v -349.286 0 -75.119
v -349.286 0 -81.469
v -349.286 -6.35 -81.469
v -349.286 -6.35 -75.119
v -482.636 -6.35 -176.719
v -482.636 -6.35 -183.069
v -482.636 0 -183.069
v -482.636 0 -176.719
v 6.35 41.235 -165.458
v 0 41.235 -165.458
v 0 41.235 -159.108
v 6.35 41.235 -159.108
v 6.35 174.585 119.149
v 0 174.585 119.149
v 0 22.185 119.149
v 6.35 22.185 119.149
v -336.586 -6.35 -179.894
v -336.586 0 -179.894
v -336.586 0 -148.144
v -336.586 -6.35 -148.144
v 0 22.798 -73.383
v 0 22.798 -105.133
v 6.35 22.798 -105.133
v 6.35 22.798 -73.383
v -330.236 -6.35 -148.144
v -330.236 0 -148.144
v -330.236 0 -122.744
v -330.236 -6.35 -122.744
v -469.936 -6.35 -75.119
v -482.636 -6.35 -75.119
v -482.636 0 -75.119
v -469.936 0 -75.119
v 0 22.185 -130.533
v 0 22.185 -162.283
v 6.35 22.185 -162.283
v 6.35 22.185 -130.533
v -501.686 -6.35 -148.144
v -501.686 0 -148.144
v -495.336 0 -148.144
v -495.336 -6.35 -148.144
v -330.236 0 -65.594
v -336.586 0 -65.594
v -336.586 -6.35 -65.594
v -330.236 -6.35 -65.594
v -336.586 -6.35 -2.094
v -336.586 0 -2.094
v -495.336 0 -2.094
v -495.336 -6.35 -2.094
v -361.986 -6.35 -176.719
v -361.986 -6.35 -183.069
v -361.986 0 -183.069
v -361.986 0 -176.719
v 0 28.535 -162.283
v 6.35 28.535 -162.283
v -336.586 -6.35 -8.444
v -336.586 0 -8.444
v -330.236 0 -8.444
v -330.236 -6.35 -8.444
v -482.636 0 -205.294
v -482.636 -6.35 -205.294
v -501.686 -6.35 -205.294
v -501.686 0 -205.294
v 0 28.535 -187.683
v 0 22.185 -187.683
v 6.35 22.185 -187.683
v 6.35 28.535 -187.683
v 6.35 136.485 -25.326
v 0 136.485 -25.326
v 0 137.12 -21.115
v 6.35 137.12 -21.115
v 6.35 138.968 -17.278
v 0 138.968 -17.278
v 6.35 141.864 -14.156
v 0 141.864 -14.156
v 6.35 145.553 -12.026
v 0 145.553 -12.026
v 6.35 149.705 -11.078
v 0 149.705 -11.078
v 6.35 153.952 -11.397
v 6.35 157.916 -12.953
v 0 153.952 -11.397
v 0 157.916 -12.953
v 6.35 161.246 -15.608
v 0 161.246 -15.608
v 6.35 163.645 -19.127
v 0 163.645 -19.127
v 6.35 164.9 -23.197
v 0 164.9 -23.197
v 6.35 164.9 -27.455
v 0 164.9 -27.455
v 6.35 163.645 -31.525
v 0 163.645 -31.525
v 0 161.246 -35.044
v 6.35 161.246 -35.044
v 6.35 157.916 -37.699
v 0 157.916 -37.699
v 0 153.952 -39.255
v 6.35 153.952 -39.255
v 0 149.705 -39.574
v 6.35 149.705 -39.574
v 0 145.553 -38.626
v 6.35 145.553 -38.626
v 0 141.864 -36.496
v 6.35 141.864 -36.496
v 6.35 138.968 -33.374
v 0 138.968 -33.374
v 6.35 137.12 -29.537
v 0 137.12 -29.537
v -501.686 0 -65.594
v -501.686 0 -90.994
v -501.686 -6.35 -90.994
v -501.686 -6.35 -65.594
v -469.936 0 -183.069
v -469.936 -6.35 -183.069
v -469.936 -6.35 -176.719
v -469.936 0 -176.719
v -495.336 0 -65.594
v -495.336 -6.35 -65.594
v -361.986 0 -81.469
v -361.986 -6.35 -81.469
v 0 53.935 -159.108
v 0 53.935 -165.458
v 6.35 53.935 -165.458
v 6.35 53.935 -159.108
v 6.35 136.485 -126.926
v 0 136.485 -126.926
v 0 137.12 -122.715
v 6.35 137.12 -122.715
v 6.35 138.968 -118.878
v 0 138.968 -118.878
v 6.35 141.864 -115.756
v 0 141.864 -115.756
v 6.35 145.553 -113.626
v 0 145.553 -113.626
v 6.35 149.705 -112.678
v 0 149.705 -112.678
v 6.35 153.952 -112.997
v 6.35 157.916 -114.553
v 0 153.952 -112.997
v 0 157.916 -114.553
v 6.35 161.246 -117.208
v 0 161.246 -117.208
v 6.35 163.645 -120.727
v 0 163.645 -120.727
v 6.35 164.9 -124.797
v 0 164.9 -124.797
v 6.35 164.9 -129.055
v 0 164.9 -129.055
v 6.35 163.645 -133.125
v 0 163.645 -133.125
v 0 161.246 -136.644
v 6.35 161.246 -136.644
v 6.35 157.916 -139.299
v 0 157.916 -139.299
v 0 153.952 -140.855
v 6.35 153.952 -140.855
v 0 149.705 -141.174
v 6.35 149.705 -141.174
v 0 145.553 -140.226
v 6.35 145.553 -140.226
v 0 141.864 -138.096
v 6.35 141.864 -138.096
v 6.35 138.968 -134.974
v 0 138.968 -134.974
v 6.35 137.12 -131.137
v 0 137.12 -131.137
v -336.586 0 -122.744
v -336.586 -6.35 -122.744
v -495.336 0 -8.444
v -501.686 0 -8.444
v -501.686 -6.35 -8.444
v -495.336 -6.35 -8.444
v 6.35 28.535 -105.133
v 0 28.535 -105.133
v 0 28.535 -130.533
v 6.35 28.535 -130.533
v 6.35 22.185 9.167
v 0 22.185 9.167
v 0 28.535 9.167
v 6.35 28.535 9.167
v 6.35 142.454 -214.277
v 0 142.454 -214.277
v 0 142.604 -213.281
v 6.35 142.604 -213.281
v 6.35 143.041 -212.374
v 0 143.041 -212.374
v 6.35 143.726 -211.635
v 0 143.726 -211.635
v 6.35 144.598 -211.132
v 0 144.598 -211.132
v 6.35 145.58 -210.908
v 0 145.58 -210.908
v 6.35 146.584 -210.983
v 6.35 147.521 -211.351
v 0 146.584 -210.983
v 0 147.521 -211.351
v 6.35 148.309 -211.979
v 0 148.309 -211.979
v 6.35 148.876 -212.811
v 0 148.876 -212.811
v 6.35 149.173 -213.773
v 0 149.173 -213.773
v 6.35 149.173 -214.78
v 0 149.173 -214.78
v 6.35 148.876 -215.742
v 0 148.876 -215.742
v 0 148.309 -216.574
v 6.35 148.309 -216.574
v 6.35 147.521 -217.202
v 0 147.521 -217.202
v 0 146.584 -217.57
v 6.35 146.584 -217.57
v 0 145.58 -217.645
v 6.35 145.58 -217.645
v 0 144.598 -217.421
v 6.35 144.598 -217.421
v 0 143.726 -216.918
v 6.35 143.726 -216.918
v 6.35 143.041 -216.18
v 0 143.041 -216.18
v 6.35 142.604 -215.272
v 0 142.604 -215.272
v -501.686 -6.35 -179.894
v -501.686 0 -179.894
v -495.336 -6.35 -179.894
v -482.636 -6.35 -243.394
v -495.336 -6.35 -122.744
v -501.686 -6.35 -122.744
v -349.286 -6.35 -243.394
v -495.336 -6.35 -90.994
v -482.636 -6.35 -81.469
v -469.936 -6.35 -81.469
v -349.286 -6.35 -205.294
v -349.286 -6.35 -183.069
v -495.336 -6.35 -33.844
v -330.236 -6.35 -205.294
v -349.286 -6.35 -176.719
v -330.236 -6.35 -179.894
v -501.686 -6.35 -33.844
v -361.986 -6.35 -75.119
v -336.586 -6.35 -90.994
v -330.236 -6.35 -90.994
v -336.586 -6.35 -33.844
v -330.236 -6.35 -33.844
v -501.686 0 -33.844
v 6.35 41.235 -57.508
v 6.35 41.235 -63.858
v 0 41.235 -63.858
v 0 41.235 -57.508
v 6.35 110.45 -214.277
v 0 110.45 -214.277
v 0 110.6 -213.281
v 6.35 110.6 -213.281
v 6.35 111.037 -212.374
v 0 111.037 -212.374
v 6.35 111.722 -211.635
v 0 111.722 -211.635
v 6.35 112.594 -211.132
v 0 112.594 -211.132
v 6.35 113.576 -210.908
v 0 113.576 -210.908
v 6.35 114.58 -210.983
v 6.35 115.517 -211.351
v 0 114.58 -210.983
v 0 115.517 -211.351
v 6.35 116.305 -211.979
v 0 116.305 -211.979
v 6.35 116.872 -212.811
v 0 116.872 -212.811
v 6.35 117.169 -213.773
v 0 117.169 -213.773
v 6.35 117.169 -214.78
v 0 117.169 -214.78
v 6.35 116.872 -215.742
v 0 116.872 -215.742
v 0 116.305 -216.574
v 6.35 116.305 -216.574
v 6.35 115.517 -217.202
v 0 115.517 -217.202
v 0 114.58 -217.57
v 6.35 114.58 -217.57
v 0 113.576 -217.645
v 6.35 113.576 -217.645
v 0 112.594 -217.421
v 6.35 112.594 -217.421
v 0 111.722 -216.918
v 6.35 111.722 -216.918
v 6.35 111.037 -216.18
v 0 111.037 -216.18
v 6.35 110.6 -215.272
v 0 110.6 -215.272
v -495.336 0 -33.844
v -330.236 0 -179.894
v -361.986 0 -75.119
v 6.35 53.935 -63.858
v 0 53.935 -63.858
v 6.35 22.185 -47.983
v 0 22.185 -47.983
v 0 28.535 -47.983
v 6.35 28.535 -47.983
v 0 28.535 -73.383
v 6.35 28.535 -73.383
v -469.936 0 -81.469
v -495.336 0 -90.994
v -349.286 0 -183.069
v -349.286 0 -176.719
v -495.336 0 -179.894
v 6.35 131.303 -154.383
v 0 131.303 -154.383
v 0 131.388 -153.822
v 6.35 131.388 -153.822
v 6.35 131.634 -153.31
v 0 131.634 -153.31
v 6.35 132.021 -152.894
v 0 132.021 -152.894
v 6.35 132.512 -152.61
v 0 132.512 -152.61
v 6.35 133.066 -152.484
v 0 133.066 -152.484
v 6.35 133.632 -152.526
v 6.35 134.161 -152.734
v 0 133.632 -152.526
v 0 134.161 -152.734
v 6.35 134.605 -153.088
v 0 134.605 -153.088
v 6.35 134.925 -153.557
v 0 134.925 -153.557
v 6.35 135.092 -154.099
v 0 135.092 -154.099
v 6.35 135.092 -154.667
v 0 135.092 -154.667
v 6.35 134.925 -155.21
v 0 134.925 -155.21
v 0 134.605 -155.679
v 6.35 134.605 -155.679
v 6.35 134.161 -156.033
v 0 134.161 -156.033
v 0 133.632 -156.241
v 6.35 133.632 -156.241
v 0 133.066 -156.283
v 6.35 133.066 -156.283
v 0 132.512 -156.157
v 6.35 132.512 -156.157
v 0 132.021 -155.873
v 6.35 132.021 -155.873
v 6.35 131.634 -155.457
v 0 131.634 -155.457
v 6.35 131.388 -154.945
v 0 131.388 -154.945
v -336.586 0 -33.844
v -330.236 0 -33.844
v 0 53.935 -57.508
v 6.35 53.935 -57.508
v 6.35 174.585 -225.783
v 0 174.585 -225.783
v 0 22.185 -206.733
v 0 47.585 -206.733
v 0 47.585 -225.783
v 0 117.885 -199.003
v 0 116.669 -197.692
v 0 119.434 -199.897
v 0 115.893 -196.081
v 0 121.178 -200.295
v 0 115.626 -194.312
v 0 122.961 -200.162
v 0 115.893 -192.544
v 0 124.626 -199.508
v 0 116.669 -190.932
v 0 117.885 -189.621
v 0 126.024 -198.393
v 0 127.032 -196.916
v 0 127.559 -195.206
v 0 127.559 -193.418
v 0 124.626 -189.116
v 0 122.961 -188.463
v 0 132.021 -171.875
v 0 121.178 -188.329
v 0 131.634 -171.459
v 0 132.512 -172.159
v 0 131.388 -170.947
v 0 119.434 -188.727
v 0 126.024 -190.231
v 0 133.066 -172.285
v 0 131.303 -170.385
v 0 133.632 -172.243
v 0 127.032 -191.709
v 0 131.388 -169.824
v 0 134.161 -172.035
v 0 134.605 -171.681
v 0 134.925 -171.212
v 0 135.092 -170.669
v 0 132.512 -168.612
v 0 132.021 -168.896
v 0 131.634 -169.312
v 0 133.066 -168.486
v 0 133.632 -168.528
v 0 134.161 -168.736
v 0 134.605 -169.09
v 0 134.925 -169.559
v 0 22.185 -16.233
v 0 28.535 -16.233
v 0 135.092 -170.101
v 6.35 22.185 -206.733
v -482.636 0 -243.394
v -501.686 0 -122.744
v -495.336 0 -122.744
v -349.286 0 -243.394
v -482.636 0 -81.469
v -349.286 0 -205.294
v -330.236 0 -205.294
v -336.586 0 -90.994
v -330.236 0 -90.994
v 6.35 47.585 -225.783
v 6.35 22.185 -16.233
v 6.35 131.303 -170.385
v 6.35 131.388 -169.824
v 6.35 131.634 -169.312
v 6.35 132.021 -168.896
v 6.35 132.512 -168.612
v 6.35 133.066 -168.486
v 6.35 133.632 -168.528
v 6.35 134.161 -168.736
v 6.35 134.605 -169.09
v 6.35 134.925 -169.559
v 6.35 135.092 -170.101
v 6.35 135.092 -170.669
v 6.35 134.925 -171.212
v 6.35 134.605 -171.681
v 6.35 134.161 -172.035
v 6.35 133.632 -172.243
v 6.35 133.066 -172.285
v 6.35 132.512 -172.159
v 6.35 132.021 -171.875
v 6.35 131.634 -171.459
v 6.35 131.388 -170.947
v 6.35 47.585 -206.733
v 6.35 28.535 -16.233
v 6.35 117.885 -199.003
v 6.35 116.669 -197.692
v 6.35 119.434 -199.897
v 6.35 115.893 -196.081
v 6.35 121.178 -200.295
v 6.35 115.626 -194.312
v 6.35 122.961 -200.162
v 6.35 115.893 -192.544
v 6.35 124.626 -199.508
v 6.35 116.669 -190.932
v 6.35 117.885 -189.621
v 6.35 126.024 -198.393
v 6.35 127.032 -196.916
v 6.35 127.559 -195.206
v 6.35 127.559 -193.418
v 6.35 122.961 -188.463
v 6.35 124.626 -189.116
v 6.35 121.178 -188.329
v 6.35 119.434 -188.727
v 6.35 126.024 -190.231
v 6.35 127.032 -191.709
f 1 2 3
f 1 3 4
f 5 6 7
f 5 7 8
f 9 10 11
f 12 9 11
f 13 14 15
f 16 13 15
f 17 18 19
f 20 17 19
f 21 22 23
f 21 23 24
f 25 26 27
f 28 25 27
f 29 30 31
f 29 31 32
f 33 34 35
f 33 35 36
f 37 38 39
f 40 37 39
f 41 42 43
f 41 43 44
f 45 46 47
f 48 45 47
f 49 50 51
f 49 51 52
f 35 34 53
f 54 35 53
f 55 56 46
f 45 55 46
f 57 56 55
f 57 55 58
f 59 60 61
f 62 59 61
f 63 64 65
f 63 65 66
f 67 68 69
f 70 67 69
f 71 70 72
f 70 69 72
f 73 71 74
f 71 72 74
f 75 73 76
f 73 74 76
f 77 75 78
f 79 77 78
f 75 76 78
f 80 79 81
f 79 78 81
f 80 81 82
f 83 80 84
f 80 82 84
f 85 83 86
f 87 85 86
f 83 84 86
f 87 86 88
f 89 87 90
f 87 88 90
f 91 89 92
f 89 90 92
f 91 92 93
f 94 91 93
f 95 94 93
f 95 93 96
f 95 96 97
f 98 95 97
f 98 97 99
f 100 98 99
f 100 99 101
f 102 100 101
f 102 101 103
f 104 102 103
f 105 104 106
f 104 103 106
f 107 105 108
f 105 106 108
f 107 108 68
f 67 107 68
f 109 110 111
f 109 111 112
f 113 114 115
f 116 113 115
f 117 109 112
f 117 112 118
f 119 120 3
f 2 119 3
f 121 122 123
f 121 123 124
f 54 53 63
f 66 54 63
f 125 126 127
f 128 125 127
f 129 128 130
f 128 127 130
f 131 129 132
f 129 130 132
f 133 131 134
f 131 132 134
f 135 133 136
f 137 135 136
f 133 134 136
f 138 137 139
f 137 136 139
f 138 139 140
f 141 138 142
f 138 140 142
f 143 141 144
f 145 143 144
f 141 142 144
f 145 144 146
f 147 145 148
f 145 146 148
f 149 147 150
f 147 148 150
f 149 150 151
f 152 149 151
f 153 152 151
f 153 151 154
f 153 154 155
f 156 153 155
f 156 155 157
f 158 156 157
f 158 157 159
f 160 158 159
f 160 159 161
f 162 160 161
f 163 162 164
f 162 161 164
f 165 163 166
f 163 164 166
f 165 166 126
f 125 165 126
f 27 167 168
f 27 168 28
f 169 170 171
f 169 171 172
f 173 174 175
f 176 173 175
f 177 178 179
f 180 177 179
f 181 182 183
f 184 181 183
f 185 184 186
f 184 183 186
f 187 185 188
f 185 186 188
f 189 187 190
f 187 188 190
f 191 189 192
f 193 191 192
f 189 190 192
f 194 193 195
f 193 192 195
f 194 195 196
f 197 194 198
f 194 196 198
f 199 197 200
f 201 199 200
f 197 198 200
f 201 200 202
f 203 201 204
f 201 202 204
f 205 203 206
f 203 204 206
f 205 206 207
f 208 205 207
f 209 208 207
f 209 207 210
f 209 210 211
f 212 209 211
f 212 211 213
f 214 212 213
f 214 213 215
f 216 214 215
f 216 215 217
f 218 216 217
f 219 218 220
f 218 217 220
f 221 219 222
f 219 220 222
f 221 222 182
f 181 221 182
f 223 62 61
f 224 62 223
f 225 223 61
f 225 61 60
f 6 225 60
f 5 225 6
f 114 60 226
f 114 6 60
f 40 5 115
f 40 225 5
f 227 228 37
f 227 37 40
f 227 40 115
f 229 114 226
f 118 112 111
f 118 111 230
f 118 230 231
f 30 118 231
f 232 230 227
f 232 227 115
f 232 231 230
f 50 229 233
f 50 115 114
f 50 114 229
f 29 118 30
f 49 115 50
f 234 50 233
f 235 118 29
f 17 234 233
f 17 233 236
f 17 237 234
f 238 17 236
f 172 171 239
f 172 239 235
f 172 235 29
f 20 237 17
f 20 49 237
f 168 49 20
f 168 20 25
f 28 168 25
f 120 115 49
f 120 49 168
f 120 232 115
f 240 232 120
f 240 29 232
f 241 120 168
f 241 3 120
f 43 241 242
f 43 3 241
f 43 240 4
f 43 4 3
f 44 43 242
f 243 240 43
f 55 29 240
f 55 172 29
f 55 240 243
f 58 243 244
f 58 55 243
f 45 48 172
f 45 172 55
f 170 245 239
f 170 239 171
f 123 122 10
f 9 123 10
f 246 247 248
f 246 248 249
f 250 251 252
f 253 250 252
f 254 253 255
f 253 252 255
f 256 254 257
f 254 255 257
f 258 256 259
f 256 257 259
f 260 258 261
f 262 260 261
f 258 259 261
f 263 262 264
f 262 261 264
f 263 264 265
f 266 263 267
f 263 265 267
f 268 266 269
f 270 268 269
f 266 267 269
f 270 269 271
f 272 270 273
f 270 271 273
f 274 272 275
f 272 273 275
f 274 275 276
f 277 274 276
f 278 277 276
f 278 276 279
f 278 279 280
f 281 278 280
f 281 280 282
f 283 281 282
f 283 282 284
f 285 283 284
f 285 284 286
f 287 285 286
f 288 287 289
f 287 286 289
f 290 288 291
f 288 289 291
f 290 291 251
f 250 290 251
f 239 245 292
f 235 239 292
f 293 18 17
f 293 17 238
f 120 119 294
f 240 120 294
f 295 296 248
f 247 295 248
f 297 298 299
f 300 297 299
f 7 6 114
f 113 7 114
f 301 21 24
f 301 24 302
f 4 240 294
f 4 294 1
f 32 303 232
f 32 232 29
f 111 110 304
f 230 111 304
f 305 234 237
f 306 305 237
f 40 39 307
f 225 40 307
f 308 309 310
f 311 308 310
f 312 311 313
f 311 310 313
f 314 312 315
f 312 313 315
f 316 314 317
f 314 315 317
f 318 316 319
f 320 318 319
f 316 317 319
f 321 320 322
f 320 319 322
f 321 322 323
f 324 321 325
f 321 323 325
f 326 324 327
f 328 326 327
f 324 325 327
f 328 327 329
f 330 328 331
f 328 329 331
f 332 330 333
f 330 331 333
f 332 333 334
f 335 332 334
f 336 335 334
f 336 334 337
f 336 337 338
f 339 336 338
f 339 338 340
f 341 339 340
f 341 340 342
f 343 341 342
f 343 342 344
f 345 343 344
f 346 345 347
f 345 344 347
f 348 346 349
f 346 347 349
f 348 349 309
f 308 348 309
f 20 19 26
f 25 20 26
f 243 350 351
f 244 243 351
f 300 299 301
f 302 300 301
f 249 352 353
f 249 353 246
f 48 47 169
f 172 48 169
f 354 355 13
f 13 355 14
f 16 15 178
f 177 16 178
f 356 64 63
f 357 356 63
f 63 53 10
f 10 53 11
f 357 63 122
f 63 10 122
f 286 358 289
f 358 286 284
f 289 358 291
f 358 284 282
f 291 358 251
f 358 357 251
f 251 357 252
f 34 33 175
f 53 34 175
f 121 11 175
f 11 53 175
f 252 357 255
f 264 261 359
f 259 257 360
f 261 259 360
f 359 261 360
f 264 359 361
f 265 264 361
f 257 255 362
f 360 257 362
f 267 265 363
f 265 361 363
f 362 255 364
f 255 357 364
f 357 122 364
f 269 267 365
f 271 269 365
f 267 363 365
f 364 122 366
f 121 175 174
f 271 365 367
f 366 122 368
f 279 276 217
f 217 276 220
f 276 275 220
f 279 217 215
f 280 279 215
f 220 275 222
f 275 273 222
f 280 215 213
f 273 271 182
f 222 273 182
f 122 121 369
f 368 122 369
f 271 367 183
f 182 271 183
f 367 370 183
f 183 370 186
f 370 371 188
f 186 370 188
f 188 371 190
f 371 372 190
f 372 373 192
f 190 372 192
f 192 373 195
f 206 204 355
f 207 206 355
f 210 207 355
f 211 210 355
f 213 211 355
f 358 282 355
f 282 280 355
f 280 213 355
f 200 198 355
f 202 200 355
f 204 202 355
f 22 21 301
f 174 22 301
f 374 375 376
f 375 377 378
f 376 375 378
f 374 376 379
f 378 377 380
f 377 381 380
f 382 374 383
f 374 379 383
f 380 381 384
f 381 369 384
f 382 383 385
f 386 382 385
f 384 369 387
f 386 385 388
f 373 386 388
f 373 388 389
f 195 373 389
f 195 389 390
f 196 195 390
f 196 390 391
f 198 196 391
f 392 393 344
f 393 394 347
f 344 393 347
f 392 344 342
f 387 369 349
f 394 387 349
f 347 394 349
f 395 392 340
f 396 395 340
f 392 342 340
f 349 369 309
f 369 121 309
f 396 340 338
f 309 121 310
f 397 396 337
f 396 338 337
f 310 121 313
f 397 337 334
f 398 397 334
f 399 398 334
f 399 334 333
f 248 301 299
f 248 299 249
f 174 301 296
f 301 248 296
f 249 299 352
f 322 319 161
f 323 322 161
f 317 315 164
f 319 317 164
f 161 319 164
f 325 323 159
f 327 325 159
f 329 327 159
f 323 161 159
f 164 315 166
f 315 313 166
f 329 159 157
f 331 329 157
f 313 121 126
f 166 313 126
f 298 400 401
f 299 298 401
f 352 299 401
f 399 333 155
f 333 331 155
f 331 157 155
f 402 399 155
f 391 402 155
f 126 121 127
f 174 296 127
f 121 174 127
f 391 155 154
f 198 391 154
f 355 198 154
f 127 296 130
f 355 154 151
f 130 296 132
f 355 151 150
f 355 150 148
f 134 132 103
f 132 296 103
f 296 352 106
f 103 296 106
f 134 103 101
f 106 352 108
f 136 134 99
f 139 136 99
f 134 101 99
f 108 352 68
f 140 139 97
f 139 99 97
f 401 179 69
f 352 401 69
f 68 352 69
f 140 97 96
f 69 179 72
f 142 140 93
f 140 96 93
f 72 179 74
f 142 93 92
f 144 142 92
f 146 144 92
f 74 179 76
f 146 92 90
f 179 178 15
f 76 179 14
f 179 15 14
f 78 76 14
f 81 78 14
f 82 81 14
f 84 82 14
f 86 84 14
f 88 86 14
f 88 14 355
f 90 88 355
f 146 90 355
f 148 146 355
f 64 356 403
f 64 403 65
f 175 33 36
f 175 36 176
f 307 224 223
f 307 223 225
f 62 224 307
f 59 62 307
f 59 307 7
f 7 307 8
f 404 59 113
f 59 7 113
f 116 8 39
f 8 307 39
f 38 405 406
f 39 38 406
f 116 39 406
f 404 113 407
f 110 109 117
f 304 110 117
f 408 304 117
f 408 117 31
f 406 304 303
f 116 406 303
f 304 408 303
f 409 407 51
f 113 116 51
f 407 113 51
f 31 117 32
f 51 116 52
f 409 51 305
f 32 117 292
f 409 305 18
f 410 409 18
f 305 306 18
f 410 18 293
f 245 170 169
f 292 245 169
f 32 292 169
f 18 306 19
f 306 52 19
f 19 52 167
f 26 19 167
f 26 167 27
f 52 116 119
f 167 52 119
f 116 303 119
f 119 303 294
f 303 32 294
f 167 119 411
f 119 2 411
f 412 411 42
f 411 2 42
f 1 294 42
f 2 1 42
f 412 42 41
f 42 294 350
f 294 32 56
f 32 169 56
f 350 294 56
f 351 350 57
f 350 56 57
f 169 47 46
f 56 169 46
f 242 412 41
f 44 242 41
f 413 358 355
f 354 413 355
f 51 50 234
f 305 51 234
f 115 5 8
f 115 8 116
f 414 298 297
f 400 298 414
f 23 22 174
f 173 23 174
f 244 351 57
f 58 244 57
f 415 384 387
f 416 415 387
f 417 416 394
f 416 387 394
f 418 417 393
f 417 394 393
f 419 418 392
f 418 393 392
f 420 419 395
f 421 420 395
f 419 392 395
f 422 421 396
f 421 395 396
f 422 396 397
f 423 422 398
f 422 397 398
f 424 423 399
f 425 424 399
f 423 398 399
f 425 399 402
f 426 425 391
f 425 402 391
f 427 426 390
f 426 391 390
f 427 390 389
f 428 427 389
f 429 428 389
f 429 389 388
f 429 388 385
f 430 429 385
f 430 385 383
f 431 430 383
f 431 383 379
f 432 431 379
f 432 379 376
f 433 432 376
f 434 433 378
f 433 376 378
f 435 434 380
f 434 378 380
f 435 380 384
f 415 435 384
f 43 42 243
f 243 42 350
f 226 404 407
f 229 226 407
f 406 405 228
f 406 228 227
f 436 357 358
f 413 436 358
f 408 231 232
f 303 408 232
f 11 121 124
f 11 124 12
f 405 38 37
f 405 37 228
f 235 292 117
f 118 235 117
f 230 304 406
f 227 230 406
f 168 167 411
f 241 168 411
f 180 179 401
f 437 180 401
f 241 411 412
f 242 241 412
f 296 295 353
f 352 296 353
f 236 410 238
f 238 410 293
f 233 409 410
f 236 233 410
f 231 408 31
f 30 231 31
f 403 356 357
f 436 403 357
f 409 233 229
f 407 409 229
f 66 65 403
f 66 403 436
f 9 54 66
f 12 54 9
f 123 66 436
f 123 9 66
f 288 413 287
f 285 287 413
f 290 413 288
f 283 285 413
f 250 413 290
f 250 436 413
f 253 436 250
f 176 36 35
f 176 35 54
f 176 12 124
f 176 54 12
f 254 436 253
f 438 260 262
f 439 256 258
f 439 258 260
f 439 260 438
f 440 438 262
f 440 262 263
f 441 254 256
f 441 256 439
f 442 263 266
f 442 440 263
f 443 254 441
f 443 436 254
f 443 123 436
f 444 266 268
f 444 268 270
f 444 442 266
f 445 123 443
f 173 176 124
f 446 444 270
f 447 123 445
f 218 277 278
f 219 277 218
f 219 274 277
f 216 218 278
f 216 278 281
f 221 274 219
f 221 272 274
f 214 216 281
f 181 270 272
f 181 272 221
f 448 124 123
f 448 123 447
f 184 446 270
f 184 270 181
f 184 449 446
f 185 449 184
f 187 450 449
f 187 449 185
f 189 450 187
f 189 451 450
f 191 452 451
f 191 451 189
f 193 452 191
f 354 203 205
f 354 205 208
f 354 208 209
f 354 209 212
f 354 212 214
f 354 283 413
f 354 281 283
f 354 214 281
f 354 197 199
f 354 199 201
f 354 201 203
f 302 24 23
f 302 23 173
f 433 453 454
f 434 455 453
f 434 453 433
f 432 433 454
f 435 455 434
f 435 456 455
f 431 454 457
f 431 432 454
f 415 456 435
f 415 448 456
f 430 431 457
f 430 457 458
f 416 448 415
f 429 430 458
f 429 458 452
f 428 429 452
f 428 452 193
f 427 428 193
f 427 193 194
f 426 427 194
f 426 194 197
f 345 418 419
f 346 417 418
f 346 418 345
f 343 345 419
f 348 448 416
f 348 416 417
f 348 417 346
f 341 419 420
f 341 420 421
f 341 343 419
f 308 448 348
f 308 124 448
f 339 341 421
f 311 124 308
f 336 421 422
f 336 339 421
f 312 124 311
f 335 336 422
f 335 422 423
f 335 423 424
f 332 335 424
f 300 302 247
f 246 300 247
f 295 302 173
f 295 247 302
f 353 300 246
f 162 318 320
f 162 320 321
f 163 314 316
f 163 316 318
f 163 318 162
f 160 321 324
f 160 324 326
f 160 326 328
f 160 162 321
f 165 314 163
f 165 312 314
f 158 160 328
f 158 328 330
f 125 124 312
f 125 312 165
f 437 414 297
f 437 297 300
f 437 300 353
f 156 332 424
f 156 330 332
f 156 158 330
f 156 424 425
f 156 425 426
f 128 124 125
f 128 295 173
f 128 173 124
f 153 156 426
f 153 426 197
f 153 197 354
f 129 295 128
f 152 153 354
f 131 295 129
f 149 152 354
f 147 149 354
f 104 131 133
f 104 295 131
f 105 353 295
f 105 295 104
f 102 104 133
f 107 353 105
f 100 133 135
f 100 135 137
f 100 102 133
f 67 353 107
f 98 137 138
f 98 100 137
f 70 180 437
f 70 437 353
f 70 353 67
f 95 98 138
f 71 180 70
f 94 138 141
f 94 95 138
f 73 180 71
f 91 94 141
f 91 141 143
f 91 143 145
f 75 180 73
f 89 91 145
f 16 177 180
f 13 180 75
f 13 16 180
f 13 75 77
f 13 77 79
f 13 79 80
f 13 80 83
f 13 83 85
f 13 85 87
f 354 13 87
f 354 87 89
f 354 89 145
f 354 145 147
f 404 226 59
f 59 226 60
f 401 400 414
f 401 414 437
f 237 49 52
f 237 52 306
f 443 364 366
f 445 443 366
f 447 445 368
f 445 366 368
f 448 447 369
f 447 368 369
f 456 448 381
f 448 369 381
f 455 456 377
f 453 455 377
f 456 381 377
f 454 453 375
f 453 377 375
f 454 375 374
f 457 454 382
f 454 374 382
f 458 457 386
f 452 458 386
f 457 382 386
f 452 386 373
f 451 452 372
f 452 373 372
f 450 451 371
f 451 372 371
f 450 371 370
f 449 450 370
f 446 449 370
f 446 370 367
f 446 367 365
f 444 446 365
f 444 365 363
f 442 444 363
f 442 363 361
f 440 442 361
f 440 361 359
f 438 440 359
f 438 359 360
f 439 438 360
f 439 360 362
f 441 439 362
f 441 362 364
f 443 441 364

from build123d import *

# Parameters (mm, degrees)
F0_W      = 6.35
F0_H      = 25.4
F0_H_2    = 6.35
F1_DEPTH  = 6.35
F2_W      = 5.7369639019
F2_H      = 31.75
F2_W_2    = 6.35
F2_H_2    = 19.05
F2_H_3    = 103.632
F2_H_4    = 6.35
F3_DEPTH  = 6.35
F4_R      = 14.2875
F5_DEPTH  = 6.35
F6_W      = 12.7
F6_H      = 6.35
F7_DEPTH  = 6.35
F8_W      = 12.7
F8_H      = 6.35
F9_DEPTH  = 6.35
F11_DEPTH = 6.35
F12_R     = 6
F13_DEPTH = 25.4
F14_R     = 3.3782
F14_R_2   = 1.905
F15_DEPTH = 6.35


# Not quite as in the source:
# - a feature names something its author has since deleted; it is built from what else it names


with BuildPart() as f1:
    # F0 (on Front) → F1 (new body)
    with BuildSketch(Plane.XZ):
        with Locations((-498.5113858938, -21.1435346045)):
            Rectangle(F0_W, F0_H)
        with Locations((-498.5113858938, -78.2935346045)):
            Rectangle(F0_W, F0_H)
        with Locations((-498.5113858938, -135.4435346045)):
            Rectangle(F0_W, F0_H)
        with Locations((-498.5113858938, -192.5935346045)):
            Rectangle(F0_W, F0_H)
        with Locations((-498.5113858938, -240.2185346045)):
            Rectangle(F0_W, F0_H_2)
        with Locations((-333.4113858938, -240.2185346045)):
            Rectangle(F0_W, F0_H_2)
        with Locations((-333.4113858938, -192.5935346045)):
            Rectangle(F0_W, F0_H)
        with Locations((-333.4113858938, -135.4435346045)):
            Rectangle(F0_W, F0_H)
        with Locations((-333.4113858938, -78.2935346045)):
            Rectangle(F0_W, F0_H)
        with Locations((-333.4113858938, -21.1435346045)):
            Rectangle(F0_W, F0_H)
        Polygon((-495.3363858938, -237.0435346045), (-495.3363858938, -243.3935346045), (-336.5863858938, -243.3935346045), (-336.5863858938, -237.0435346045), (-336.5863858938, -205.2935346045), (-336.5863858938, -179.8935346045), (-336.5863858938, -148.1435346045), (-336.5863858938, -122.7435346045), (-336.5863858938, -90.9935346045), (-336.5863858938, -65.5935346045), (-336.5863858938, -33.8435346045), (-336.5863858938, -8.4435346045), (-336.5863858938, -2.0935346045), (-495.3363858938, -2.0935346045), (-495.3363858938, -8.4435346045), (-495.3363858938, -33.8435346045), (-495.3363858938, -65.5935346045), (-495.3363858938, -90.9935346045), (-495.3363858938, -122.7435346045), (-495.3363858938, -148.1435346045), (-495.3363858938, -179.8935346045), (-495.3363858938, -205.2935346045), align=None)
    extrude(amount=F1_DEPTH)

    # F8 (on face) → F9 (cut)
    with BuildSketch(Plane.XZ.offset(6.35)):
        with Locations((-476.2863858938, -78.2935346045)):
            Rectangle(F8_W, F8_H)
        with Locations((-476.2863858938, -179.8935346045)):
            Rectangle(F8_W, F8_H)
        with Locations((-355.6363858938, -78.2935346045)):
            Rectangle(F8_W, F8_H)
        with Locations((-355.6363858938, -179.8935346045)):
            Rectangle(F8_W, F8_H)
    extrude(amount=-F9_DEPTH, mode=Mode.SUBTRACT)

    # F10 (on face) → F11 (cut)
    with BuildSketch(Plane.XZ.offset(6.35)):
        Polygon((-501.6863858938, -243.3935346045), (-482.6363858938, -243.3935346045), (-482.6363858938, -205.2935346045), (-495.3363858938, -205.2935346045), (-495.3363858938, -237.0435346045), (-501.6863858938, -237.0435346045), align=None)
        Polygon((-349.2863858938, -205.2935346045), (-349.2863858938, -243.3935346045), (-330.2363858938, -243.3935346045), (-330.2363858938, -237.0435346045), (-336.5863858938, -237.0435346045), (-336.5863858938, -205.2935346045), align=None)
    extrude(amount=-F11_DEPTH, mode=Mode.SUBTRACT)


with BuildPart() as f3:
    # F2 (on Right) → F3 (new body)
    with BuildSketch(Plane.YZ):
        with Locations((25.6664895297, -89.2577976048)):
            Rectangle(F2_W, F2_H)
        with Locations((25.3599714807, -32.1077976048)):
            Rectangle(F2_W_2, F2_H)
        with Locations((25.3599714807, -146.4077976048)):
            Rectangle(F2_W_2, F2_H)
        with Locations((25.3599714807, -197.2077976048)):
            Rectangle(F2_W_2, F2_H_2)
        with Locations((25.3599714807, 67.3332023952)):
            Rectangle(F2_W_2, F2_H_3)
        with Locations((25.3599714807, 12.3422023952)):
            Rectangle(F2_W_2, F2_H_4)
        Polygon((28.5349714807, 9.1672023952), (28.5349714807, -16.2327976048), (28.5349714807, -47.9827976048), (28.5349714807, -73.3827976048), (28.5349714807, -105.1327976048), (28.5349714807, -130.5327976048), (28.5349714807, -162.2827976048), (28.5349714807, -187.6827976048), (28.5349714807, -206.7327976048), (47.5849714807, -206.7327976048), (47.5849714807, -225.7827976048), (174.5849714807, -225.7827976048), (174.5849714807, 119.1492023952), (28.5349714807, 119.1492023952), (28.5349714807, 15.5172023952), align=None)
    extrude(amount=F3_DEPTH)

    # F4 (on face) → F5 (cut)
    with BuildSketch(Plane(origin=(0, 0, 0), x_dir=(0, -1, 0), z_dir=(-1, 0, 0))):
        with Locations((-150.7724714807, -25.3259976048)):
            Circle(F4_R)
        with Locations((-150.7724714807, -126.9259976048)):
            Circle(F4_R)
    extrude(amount=-F5_DEPTH, mode=Mode.SUBTRACT)

    # F6 (on face) → F7 (cut)
    with BuildSketch(Plane(origin=(0, 0, 0), x_dir=(0, -1, 0), z_dir=(-1, 0, 0))):
        with Locations((-47.5849714807, -60.6827976048)):
            Rectangle(F6_W, F6_H)
        with Locations((-47.5849714807, -162.2827976048)):
            Rectangle(F6_W, F6_H)
    extrude(amount=-F7_DEPTH, mode=Mode.SUBTRACT)

    # F12 (on face) → F13 (cut)
    with BuildSketch(Plane(origin=(0, 0, 0), x_dir=(0, -1, 0), z_dir=(-1, 0, 0))):
        with Locations((-121.6259714807, -194.3121976048)):
            Circle(F12_R)
    extrude(amount=-F13_DEPTH, mode=Mode.SUBTRACT)

    # F14 (on face) → F15 (cut)
    with BuildSketch(Plane(origin=(0, 0, 0), x_dir=(0, -1, 0), z_dir=(-1, 0, 0))):
        with Locations((-145.8321714807, -214.2765976048)):
            Circle(F14_R)
        with Locations((-113.8281714807, -214.2765976048)):
            Circle(F14_R)
        with Locations((-133.2083714807, -170.3853976048)):
            Circle(F14_R_2)
        with Locations((-133.2083714807, -154.3833976048)):
            Circle(F14_R_2)
    extrude(amount=-F15_DEPTH, mode=Mode.SUBTRACT)


solid = Compound([f1.part, f3.part])
